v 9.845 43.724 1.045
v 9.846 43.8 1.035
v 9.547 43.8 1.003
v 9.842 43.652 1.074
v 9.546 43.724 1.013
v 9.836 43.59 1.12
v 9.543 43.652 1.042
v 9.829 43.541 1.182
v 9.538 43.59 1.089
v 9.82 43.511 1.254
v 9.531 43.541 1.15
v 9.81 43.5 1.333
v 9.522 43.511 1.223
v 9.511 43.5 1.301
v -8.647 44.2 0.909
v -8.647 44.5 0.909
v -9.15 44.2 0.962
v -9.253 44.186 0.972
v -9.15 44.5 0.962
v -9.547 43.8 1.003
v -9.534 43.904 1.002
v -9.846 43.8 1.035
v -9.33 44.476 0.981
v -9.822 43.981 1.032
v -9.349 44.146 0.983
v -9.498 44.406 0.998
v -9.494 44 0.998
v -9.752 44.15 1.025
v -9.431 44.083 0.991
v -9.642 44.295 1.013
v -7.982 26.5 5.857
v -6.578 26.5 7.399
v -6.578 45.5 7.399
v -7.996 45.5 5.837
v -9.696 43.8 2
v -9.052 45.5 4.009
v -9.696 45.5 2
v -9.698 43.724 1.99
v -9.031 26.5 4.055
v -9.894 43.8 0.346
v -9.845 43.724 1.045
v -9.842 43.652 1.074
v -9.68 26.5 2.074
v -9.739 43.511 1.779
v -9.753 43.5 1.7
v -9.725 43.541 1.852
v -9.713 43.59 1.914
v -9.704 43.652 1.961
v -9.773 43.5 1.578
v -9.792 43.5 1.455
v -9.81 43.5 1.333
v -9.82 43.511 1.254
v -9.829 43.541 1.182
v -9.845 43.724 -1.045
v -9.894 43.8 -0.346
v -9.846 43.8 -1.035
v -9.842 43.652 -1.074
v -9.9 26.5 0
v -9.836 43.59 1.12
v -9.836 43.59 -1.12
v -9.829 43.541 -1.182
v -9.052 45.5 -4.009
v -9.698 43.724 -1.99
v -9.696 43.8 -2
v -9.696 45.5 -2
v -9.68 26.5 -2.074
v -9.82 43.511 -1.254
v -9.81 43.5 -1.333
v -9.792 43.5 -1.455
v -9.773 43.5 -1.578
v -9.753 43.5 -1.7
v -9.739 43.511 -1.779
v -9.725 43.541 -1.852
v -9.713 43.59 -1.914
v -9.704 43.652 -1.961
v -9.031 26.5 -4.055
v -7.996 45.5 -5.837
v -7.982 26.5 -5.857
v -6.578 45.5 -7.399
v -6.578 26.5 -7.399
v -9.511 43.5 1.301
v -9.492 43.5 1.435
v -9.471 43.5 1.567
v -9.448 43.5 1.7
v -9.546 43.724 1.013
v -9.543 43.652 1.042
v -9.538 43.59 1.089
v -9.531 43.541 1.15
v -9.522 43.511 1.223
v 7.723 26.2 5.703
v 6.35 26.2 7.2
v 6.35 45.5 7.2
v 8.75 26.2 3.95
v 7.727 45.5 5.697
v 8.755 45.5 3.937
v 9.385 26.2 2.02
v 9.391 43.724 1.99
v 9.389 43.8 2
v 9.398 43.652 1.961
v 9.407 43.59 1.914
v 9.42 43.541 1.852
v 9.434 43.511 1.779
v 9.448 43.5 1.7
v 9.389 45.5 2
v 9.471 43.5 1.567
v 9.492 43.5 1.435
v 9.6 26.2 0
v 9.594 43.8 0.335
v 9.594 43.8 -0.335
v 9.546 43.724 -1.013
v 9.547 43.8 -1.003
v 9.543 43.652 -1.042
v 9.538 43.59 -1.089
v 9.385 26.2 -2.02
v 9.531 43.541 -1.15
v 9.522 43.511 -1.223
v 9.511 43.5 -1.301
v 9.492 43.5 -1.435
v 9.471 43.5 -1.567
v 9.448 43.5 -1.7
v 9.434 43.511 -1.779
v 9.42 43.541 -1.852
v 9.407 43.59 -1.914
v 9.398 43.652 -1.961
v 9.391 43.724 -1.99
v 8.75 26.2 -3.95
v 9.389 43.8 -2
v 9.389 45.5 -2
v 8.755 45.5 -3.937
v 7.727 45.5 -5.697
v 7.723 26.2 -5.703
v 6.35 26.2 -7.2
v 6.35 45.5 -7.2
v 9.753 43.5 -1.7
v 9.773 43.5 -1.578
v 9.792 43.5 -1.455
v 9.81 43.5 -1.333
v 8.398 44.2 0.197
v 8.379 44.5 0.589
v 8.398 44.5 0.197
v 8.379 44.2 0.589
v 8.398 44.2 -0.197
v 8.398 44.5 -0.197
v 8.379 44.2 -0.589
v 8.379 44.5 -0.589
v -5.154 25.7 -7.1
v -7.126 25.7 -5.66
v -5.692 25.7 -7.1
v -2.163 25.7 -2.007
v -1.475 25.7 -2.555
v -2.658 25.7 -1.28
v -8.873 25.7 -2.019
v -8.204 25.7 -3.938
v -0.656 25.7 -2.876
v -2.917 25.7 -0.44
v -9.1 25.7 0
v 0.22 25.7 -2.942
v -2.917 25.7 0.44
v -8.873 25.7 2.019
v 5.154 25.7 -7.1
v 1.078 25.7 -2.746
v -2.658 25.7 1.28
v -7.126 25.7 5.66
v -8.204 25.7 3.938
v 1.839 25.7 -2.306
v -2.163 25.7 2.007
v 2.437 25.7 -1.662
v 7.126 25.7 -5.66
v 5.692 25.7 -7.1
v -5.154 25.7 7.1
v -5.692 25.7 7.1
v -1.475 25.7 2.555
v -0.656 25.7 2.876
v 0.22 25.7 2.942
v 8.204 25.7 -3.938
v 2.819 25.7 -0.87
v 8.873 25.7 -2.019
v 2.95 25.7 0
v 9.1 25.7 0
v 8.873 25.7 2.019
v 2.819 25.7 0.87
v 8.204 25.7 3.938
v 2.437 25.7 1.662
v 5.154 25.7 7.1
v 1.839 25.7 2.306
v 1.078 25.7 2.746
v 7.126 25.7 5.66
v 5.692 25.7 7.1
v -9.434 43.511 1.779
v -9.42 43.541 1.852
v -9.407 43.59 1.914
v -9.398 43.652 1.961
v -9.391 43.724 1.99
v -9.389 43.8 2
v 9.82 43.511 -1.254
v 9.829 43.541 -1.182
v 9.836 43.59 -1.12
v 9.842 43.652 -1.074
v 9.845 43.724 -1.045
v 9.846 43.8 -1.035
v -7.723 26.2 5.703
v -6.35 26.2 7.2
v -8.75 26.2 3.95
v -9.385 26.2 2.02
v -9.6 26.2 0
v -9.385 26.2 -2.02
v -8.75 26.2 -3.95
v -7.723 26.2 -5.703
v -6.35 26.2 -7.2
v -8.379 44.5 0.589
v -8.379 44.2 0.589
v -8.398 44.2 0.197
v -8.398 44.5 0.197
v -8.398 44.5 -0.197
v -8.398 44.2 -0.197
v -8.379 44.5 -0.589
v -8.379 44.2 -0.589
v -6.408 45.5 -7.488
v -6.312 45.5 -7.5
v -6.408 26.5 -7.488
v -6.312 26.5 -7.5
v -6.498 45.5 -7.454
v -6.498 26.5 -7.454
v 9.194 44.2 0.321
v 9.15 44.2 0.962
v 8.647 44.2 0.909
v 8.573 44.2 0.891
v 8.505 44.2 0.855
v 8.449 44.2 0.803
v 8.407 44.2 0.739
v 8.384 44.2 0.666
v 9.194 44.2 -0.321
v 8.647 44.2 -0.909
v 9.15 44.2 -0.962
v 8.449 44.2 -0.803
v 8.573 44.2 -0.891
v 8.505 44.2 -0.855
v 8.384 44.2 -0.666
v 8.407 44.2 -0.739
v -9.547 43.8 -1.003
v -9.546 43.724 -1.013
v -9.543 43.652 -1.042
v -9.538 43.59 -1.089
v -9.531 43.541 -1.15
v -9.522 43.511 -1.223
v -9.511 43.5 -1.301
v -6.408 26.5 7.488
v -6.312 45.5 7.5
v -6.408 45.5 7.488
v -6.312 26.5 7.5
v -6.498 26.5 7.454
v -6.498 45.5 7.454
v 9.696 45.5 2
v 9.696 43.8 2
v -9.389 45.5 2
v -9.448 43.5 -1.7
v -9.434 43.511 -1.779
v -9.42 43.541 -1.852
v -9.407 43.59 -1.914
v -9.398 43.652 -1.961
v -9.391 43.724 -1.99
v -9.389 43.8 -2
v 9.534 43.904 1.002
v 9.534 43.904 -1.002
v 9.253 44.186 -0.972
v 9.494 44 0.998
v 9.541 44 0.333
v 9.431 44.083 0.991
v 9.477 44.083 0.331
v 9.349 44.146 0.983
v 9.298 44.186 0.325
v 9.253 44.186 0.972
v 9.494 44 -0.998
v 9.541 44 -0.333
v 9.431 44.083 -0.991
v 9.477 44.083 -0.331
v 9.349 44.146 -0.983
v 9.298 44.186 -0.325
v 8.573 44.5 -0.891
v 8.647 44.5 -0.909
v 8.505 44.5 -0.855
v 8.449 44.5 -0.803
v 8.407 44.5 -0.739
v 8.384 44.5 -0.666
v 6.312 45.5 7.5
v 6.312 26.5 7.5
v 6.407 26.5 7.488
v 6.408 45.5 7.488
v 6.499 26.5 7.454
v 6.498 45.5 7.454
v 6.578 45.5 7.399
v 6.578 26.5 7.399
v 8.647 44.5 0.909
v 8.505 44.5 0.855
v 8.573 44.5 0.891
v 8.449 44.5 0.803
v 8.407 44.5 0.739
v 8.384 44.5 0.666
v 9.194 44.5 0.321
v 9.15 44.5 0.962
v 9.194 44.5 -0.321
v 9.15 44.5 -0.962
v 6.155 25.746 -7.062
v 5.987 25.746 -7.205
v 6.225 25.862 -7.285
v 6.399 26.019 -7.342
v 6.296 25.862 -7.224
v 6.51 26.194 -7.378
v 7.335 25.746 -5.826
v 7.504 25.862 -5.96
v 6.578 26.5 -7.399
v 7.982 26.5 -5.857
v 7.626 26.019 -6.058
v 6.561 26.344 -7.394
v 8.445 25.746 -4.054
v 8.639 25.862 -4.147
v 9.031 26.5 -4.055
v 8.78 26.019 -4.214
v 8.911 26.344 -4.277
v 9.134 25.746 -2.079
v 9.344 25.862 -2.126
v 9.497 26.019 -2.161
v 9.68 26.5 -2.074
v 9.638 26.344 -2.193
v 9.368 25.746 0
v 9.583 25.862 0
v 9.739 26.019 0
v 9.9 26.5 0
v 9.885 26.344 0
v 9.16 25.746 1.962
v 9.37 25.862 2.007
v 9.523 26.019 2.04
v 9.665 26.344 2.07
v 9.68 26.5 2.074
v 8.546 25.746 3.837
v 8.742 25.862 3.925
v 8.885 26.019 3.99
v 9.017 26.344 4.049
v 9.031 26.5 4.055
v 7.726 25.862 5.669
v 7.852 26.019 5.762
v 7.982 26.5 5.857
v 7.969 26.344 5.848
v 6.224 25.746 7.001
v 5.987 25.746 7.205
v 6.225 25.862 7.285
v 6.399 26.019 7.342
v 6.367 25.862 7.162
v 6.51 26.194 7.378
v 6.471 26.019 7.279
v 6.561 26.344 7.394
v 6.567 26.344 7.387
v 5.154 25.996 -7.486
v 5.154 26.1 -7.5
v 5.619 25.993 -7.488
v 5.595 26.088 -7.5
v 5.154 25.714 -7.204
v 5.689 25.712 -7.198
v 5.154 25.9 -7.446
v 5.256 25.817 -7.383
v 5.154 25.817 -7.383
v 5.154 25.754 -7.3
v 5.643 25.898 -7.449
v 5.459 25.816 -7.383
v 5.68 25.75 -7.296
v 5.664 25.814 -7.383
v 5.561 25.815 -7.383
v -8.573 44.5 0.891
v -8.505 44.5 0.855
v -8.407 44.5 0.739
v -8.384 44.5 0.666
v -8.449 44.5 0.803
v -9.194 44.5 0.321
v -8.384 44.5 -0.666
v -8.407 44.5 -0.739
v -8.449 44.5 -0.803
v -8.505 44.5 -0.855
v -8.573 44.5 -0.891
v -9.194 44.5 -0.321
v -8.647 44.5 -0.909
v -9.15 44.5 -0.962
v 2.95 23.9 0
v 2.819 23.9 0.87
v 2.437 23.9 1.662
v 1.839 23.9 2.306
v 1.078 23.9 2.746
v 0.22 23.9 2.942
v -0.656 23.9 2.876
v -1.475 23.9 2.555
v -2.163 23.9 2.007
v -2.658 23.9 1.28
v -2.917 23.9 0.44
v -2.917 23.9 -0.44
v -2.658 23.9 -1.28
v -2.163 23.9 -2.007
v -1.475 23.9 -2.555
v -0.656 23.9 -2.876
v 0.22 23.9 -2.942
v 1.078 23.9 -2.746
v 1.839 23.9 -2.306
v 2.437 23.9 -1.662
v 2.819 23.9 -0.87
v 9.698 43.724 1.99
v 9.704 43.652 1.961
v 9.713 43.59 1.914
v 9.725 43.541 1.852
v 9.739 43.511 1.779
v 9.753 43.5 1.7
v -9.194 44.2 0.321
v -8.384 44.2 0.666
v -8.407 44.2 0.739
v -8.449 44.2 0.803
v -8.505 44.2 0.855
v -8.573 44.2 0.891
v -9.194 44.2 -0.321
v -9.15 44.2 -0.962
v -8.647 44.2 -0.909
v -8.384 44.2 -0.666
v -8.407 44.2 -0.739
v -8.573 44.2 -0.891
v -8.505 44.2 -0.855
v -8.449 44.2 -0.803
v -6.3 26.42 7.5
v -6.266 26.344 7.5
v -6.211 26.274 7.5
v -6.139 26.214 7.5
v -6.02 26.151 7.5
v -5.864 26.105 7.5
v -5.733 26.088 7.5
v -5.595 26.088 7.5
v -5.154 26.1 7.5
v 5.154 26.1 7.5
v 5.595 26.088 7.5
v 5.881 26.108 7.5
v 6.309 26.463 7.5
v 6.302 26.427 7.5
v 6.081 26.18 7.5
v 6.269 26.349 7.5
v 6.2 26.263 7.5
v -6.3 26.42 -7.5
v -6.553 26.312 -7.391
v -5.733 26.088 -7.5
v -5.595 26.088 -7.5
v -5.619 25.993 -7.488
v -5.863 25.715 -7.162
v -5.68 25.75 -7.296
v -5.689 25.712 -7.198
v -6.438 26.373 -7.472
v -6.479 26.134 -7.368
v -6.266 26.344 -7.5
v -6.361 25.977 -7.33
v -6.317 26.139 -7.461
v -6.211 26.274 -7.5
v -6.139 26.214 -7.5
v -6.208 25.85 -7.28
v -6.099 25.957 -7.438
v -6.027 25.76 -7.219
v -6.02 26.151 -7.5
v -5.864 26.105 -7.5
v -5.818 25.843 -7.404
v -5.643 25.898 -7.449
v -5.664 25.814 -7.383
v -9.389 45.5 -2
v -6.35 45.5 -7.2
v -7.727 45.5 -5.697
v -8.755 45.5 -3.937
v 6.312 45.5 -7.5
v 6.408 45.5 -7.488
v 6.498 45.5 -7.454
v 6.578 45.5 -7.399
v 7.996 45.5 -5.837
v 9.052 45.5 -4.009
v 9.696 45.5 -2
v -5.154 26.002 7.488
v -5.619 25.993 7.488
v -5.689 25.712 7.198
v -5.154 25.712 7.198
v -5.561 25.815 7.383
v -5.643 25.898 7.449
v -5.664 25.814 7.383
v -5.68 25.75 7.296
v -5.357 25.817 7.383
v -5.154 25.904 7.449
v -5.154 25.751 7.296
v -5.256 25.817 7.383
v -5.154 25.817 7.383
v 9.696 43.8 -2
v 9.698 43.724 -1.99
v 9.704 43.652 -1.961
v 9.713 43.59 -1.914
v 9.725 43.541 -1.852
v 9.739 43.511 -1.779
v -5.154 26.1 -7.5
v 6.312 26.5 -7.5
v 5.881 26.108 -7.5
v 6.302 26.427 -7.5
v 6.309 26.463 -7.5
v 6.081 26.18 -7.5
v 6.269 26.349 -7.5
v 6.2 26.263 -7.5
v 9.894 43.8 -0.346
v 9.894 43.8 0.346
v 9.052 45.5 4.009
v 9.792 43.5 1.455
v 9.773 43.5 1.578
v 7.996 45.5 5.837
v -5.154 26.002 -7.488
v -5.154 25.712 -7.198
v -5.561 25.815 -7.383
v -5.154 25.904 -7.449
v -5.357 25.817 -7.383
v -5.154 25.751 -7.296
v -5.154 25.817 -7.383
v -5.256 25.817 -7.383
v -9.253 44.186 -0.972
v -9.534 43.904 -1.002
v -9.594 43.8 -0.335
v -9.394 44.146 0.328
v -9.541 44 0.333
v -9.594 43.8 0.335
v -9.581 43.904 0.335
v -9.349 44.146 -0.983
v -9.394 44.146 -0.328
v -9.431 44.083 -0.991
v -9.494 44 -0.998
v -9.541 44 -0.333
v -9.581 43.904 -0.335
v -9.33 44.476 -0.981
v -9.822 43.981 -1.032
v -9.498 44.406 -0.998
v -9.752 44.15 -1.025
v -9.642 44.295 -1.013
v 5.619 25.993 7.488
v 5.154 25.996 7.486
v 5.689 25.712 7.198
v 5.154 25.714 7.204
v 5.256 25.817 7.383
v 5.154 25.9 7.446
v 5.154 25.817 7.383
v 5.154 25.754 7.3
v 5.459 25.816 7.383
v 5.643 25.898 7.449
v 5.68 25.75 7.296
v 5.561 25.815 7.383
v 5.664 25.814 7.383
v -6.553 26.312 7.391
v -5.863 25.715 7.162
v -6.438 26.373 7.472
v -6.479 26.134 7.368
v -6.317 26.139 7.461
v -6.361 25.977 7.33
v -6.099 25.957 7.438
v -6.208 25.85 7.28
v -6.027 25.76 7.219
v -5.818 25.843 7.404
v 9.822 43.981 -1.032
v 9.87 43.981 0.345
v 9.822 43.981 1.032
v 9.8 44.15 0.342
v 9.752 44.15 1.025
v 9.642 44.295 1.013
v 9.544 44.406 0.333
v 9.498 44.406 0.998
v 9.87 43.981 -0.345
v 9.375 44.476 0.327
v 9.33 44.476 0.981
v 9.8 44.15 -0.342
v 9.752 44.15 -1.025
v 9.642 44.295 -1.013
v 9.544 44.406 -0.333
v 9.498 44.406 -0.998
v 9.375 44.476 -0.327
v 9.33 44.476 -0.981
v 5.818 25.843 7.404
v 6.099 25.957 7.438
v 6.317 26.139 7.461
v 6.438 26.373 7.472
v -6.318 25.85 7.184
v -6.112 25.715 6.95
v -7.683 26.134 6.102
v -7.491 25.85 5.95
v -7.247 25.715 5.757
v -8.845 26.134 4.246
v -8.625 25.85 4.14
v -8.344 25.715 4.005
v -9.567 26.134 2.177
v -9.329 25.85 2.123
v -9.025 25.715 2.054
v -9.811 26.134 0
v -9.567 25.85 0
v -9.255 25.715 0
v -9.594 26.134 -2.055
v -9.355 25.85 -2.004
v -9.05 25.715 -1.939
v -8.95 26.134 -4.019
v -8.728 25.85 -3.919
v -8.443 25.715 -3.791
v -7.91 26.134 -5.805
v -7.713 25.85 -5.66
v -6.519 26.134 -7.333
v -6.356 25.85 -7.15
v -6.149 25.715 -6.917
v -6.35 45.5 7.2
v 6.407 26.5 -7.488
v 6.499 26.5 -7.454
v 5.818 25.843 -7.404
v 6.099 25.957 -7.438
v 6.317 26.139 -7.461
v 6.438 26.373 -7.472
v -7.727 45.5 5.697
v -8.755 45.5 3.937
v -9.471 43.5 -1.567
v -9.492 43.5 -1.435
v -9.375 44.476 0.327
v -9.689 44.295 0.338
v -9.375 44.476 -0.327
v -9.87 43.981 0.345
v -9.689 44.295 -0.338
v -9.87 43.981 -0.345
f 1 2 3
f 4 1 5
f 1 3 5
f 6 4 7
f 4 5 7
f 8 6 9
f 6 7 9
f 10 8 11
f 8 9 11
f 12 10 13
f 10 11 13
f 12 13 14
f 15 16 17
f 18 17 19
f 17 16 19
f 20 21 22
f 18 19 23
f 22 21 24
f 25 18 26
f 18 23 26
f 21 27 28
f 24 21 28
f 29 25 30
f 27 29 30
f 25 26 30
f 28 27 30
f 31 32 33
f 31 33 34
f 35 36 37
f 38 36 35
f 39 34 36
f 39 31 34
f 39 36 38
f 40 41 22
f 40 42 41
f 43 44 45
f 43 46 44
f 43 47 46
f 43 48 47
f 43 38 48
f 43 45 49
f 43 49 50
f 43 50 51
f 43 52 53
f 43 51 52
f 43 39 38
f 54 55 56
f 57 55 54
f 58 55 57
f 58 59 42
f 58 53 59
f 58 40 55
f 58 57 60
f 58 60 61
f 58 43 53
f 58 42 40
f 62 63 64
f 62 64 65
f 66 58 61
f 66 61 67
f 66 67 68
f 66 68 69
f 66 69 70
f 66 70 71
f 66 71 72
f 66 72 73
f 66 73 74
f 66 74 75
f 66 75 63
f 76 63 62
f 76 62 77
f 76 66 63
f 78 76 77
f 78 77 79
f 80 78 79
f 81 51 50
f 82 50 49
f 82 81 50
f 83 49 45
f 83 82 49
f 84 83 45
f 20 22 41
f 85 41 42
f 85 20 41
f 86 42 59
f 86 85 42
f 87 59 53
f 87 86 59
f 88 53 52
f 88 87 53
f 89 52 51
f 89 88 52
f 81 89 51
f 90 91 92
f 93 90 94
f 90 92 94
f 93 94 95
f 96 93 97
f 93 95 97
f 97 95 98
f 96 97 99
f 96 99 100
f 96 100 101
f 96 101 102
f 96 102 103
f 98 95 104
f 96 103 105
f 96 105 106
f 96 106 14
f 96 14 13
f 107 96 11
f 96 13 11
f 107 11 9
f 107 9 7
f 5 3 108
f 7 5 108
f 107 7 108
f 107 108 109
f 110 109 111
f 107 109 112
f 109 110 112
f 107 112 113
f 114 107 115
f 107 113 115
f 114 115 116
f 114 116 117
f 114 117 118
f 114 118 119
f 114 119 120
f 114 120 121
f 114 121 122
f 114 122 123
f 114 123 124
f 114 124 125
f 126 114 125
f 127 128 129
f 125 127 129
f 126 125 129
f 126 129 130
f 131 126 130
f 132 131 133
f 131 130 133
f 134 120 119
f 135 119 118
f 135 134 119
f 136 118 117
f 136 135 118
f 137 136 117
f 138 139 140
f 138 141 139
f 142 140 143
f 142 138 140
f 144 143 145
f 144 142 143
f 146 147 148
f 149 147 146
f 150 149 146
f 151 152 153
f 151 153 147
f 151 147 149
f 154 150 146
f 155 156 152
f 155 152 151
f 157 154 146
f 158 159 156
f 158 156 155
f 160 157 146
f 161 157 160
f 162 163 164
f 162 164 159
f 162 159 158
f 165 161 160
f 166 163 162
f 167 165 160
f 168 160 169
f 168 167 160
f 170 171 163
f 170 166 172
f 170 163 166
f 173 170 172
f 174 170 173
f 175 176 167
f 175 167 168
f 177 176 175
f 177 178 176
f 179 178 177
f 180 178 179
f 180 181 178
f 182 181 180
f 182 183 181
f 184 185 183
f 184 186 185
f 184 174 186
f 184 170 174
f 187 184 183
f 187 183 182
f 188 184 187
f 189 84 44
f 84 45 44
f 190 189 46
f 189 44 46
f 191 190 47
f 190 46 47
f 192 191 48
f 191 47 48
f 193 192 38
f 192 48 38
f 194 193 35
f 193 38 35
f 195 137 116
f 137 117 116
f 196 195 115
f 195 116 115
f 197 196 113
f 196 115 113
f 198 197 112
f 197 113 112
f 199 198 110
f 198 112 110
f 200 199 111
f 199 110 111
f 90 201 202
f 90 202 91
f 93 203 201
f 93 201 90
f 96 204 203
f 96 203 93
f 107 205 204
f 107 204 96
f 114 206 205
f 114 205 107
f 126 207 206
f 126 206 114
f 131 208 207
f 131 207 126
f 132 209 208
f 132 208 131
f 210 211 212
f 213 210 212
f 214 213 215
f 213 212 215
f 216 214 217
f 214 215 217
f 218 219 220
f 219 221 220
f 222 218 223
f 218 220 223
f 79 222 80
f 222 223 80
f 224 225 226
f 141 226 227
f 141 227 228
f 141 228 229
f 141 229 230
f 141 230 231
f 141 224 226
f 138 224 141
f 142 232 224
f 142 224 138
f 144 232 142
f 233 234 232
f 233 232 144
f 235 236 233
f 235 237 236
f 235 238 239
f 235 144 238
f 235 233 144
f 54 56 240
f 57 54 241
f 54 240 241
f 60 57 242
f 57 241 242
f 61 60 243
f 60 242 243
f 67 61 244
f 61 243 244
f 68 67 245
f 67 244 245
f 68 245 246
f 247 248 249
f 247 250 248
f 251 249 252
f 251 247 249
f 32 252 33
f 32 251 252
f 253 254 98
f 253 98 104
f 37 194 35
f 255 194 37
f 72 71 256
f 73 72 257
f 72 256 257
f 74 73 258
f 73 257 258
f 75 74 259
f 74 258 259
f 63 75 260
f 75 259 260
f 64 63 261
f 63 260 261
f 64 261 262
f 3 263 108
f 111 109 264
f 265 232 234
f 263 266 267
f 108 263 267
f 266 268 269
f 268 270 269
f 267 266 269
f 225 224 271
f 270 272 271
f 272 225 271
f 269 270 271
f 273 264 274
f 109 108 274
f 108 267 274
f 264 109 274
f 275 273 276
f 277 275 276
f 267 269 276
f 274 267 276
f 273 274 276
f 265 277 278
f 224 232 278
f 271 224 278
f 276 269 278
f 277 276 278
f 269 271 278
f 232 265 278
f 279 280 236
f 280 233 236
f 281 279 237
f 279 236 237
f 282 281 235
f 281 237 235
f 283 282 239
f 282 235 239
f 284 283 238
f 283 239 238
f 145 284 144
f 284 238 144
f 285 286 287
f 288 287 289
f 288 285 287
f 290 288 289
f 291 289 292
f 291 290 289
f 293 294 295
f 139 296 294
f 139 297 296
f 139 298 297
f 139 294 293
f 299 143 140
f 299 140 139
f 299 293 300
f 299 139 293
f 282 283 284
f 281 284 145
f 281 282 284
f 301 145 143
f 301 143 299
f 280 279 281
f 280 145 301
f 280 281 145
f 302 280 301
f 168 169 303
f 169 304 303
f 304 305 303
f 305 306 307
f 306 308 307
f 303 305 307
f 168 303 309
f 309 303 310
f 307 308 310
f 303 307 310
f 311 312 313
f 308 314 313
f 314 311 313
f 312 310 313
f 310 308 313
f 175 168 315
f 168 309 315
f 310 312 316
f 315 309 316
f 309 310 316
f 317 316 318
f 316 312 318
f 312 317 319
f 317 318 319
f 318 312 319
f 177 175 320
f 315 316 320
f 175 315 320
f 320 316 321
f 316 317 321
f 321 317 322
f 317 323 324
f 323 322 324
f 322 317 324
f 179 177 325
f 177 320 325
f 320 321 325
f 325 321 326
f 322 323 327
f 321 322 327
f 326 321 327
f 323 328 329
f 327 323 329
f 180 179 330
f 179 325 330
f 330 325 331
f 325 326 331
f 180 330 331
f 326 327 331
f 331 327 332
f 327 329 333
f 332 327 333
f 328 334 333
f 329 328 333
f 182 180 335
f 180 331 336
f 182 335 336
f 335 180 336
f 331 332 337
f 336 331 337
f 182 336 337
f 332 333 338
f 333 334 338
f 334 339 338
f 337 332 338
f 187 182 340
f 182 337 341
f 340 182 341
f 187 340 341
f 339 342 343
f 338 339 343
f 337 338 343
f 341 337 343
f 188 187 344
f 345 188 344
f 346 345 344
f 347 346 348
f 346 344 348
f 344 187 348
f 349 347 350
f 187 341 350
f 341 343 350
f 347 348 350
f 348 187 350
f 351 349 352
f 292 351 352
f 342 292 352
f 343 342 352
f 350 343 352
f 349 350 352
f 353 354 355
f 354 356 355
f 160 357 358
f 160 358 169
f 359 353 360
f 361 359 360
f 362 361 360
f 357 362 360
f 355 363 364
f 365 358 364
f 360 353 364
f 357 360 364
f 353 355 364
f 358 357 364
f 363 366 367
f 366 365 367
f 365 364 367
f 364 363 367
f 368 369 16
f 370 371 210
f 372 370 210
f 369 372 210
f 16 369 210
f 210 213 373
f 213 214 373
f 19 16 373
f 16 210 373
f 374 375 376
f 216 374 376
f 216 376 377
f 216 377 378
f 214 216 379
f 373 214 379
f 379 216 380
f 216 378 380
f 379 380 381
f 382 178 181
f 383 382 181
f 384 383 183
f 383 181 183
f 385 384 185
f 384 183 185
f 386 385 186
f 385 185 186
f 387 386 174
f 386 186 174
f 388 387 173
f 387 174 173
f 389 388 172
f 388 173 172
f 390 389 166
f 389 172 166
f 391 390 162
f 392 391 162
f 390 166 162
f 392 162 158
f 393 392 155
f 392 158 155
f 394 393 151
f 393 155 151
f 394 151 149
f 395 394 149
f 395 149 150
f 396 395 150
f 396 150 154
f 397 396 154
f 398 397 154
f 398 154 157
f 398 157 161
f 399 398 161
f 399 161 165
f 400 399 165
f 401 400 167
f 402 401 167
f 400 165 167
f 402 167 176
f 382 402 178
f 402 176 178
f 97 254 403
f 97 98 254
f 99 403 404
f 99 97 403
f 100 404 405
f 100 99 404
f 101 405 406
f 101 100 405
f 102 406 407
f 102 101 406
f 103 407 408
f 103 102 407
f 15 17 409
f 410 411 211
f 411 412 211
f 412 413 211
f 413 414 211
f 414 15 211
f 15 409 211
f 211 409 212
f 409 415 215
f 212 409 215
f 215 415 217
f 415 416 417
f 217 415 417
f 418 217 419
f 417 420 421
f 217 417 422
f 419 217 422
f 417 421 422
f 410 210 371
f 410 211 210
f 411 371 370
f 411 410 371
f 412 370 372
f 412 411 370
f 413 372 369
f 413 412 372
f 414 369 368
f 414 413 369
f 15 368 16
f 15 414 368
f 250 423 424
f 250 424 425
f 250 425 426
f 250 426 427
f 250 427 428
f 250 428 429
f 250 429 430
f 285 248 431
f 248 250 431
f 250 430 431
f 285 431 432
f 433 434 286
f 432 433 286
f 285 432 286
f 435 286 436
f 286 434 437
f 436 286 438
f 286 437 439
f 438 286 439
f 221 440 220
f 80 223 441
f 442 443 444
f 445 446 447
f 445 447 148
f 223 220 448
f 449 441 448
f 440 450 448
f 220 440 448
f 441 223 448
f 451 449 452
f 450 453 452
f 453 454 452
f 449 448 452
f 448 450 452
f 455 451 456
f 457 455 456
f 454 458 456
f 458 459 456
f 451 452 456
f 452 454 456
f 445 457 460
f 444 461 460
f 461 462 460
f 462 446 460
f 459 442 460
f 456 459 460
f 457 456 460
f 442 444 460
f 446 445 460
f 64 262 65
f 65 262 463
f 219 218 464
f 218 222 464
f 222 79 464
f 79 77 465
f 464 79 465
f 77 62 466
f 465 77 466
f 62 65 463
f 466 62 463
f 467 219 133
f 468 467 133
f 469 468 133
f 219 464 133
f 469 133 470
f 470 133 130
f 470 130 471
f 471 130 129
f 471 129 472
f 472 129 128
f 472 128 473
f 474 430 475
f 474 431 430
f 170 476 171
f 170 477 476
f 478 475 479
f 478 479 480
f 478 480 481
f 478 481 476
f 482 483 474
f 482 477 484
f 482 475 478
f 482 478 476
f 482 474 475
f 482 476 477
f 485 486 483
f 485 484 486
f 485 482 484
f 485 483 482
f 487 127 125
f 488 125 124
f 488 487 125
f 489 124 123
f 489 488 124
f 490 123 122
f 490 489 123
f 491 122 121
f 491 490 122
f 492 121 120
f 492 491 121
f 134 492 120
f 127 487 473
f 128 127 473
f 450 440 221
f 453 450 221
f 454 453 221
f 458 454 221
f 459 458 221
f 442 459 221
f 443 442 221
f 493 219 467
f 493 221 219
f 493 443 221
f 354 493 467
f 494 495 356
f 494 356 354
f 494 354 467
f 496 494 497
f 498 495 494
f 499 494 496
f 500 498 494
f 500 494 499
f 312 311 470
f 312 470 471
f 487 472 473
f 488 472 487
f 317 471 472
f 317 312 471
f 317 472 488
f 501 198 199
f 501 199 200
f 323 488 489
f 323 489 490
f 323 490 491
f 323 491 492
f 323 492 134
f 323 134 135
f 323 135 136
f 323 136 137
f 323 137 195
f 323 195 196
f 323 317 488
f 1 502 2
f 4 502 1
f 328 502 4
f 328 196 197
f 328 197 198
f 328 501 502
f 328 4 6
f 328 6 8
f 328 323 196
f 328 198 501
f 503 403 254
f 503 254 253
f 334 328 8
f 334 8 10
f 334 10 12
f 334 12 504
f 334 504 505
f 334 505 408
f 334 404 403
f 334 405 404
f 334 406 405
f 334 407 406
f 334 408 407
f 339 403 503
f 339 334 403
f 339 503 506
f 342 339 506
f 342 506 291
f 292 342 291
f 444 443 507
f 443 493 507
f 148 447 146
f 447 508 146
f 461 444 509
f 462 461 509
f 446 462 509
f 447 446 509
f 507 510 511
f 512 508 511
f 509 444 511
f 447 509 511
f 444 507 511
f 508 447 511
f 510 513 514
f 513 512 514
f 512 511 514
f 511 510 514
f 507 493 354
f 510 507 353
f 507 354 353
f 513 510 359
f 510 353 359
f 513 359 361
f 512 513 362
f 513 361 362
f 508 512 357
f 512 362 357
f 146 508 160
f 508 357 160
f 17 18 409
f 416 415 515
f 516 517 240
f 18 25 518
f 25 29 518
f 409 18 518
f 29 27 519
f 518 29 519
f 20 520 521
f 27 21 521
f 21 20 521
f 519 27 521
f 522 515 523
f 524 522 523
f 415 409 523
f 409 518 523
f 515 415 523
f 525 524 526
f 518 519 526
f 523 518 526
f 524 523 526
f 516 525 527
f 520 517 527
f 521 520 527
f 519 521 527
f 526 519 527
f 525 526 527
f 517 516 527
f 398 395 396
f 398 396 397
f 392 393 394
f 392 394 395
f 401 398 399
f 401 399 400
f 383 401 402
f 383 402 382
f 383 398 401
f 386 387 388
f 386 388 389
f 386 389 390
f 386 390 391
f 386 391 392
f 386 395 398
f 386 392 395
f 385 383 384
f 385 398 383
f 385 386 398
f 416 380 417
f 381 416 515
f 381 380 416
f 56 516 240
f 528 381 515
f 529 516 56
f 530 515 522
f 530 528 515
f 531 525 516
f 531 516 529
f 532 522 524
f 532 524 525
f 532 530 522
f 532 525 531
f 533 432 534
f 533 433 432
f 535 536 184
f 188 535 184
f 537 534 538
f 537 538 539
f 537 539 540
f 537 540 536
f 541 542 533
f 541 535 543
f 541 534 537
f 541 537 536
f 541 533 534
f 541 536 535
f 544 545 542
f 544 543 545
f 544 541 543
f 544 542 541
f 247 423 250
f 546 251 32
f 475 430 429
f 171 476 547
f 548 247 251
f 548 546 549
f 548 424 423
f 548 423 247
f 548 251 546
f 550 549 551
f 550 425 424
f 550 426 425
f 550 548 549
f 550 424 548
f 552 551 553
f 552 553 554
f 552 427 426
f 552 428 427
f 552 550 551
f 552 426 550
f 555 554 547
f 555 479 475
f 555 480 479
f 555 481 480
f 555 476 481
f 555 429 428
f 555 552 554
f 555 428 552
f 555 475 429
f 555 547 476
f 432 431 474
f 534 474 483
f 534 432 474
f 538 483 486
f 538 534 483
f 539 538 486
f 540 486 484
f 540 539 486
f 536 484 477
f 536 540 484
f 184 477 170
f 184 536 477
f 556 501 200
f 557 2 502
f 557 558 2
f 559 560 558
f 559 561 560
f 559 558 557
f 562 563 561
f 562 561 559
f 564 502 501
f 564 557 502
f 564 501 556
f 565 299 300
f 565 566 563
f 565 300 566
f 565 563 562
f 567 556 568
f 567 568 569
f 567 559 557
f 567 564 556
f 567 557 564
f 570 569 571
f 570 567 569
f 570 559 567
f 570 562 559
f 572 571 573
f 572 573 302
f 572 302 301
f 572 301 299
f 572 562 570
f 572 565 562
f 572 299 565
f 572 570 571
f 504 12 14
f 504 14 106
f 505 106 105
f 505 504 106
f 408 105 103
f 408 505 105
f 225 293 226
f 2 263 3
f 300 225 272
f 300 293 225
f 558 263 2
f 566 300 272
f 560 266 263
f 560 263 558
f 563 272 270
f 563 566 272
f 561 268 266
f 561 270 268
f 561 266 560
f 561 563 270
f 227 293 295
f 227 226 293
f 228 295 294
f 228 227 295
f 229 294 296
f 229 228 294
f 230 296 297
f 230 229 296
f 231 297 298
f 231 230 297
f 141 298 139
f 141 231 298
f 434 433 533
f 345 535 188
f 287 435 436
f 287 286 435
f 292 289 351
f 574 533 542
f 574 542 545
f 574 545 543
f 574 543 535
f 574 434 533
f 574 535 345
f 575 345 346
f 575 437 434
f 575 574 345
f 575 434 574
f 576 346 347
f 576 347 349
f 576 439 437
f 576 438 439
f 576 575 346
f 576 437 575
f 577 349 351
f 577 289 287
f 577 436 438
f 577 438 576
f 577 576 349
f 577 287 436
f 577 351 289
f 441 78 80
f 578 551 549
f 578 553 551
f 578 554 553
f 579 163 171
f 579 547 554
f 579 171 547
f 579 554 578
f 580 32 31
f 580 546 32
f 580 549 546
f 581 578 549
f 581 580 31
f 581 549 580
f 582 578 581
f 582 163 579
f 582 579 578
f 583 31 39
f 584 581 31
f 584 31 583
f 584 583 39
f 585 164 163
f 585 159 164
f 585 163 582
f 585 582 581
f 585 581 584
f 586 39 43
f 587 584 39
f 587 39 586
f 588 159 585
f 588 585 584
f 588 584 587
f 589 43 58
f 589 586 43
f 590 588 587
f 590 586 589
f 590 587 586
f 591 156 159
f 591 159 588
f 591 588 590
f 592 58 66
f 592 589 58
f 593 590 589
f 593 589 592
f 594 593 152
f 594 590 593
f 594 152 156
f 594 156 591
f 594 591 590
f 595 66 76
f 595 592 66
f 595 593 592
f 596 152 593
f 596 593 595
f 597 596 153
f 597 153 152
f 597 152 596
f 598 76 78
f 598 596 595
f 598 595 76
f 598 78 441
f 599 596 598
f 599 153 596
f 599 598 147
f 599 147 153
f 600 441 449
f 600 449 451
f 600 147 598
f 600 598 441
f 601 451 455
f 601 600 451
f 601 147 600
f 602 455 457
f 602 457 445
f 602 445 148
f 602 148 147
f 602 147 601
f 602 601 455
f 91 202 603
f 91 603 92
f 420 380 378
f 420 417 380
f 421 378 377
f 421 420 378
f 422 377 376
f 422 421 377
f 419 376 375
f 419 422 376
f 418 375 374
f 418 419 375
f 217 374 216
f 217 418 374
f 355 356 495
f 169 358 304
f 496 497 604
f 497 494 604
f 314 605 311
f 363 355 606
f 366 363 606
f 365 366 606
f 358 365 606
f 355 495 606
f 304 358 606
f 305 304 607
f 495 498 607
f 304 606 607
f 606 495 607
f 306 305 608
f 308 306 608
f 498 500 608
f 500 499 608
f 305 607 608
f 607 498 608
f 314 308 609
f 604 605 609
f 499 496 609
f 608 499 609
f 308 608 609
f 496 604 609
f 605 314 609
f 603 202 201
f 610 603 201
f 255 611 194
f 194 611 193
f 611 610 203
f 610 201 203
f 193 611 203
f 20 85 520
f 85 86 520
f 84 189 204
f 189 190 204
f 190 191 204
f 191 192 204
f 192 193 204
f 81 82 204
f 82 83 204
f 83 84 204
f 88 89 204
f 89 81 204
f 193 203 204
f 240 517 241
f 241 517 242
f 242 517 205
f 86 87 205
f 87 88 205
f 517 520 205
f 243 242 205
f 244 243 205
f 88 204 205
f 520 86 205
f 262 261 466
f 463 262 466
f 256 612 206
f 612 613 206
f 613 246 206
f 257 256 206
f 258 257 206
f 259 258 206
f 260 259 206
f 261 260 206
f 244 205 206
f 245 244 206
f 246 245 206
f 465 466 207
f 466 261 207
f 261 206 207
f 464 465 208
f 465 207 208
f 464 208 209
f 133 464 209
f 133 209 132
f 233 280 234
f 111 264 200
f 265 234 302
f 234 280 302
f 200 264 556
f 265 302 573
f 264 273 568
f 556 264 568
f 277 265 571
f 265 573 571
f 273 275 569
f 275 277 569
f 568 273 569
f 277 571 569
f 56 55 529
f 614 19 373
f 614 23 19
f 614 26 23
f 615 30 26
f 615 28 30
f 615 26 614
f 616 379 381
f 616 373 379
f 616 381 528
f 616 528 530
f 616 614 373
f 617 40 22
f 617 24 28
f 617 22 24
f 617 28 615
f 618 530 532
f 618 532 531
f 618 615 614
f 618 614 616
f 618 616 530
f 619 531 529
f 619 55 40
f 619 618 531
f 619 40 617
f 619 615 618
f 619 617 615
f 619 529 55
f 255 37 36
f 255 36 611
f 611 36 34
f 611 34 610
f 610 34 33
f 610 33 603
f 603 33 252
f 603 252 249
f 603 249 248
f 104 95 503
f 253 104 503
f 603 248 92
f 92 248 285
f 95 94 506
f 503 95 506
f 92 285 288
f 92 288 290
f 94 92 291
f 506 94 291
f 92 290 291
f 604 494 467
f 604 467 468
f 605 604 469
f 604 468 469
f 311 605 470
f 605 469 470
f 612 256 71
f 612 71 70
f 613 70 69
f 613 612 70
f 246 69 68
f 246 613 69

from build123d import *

# Parameters (mm, degrees)
PAD036_DEPTH        = 19.8
POCKET018_DEPTH     = 19.3
SKETCH066_W         = 2
SKETCH066_H         = 4
POCKET019_DEPTH     = 9.9
REVOLUTION001_ANGLE = 12
SKETCH070_R         = 2.95
PAD044_DEPTH        = 1.8
FILLET016_R         = 0.3
FILLET017_R         = 0.8
FILLET018_R         = 0.4


with BuildPart() as part:
    # Sketch050 → Pad036 (new body)
    with BuildSketch(Plane.XZ):
        with BuildLine():
            ThreePointArc((-6.4621977686, 7.5), (-9.9, 0), (-6.4621977686, -7.5))
            Line((-6.4621977686, -7.5), (6.4621977686, -7.5))
            ThreePointArc((6.4621977686, -7.5), (9.9, 0), (6.4621977686, 7.5))
            Line((-6.4621977686, 7.5), (6.4621977686, 7.5))
        make_face()
    extrude(amount=-PAD036_DEPTH)

    # Sketch065 (on Face6 of Pad036) → Pocket018 (cut)
    with BuildSketch(Plane(origin=(0, 19.8, 0), x_dir=(1, 0, 0), z_dir=(0, 1, 0))):
        with BuildLine():
            ThreePointArc((6.3498031466, -7.2), (9.6, 0), (6.3498031466, 7.2))
            Line((-6.3498031466, 7.2), (6.3498031466, 7.2))
            ThreePointArc((-6.3498031466, 7.2), (-9.6, 0), (-6.3498031466, -7.2))
            Line((-6.3498031466, -7.2), (6.3498031466, -7.2))
        make_face()
    extrude(amount=-POCKET018_DEPTH, mode=Mode.SUBTRACT)

    # Sketch066 → Pocket019 (cut, symmetric)
    with BuildSketch(Plane.YZ):
        with Locations((18.8, 0)):
            Rectangle(SKETCH066_W, SKETCH066_H)
    extrude(amount=POCKET019_DEPTH, both=True, mode=Mode.SUBTRACT)

    # Sketch029 → Revolution001 (revolve, symmetric)
    with BuildSketch(Plane.XY) as revolution001_sk:
        with BuildLine():
            Line((-9.2, 18.8), (-8.4, 18.8))
            Line((-8.4, 18.8), (-8.4, 18.5))
            Line((-8.4, 18.5), (-9.2, 18.5))
            ThreePointArc((-9.2, 18.5), (-9.4828427125, 18.3828427125), (-9.6, 18.1))
            Line((-9.6, 18.1), (-9.6, 17.8))
            Line((-9.9, 17.8), (-9.6, 17.8))
            Line((-9.9, 18.1), (-9.9, 17.8))
            ThreePointArc((-9.2, 18.8), (-9.6949747468, 18.5949747468), (-9.9, 18.1))
        make_face()
        with BuildLine():
            Line((9.2, 18.8), (8.4, 18.8))
            Line((8.4, 18.8), (8.4, 18.5))
            Line((8.4, 18.5), (9.2, 18.5))
            ThreePointArc((9.6, 18.1), (9.4828427125, 18.3828427125), (9.2, 18.5))
            Line((9.6, 18.1), (9.6, 17.8))
            Line((9.9, 17.8), (9.6, 17.8))
            Line((9.9, 18.1), (9.9, 17.8))
            ThreePointArc((9.9, 18.1), (9.6949747468, 18.5949747468), (9.2, 18.8))
        make_face()
    revolve(axis=Axis((0, 0, 0), (0, 1, 0)), revolution_arc=REVOLUTION001_ANGLE / 2)
    revolve(revolution001_sk.sketch, axis=Axis((0, 0, 0), (0, -1, 0)), revolution_arc=REVOLUTION001_ANGLE / 2)

    # Sketch070 (on Face5 of Revolution001) → Pad044 (join)
    with BuildSketch(Plane.XZ):
        Circle(SKETCH070_R)
    extrude(amount=PAD044_DEPTH)

    # Fillet016
    fillet016_edges = [part.edges().sort_by_distance(p)[0] for p in [
        (-9.696588, 17.8, -1.019153),
        (-9.542616, 17.8, -2),
        (-9.696588, 17.8, 1.019153),
        (-9.542616, 17.8, 2),
        (-8.353984, 18.65, 0.878039),
        (-8.353984, 18.65, -0.878039),
        (9.542616, 17.8, -2),
        (9.696588, 17.8, -1.019153),
        (9.696588, 17.8, 1.019153),
        (9.542616, 17.8, 2),
        (8.353984, 18.65, 0.878039),
        (8.353984, 18.65, -0.878039),
    ]]
    fillet(fillet016_edges, radius=FILLET016_R)

    # Fillet017
    fillet017_edges = [part.edges().sort_by_distance(p)[0] for p in [
        (9.9, 0, 0),
        (-9.9, 0, 0),
    ]]
    fillet(fillet017_edges, radius=FILLET017_R)

    # Fillet018
    fillet018_edges = [part.edges().sort_by_distance(p)[0] for p in [
        (0, 0, -7.5),
        (0, 0, 7.5),
    ]]
    fillet(fillet018_edges, radius=FILLET018_R)


with BuildPart() as part_1:
    # Body022 placement: moved
    add(part.part.moved(Location((0, 25.7, 0))))


solid = part_1.part
